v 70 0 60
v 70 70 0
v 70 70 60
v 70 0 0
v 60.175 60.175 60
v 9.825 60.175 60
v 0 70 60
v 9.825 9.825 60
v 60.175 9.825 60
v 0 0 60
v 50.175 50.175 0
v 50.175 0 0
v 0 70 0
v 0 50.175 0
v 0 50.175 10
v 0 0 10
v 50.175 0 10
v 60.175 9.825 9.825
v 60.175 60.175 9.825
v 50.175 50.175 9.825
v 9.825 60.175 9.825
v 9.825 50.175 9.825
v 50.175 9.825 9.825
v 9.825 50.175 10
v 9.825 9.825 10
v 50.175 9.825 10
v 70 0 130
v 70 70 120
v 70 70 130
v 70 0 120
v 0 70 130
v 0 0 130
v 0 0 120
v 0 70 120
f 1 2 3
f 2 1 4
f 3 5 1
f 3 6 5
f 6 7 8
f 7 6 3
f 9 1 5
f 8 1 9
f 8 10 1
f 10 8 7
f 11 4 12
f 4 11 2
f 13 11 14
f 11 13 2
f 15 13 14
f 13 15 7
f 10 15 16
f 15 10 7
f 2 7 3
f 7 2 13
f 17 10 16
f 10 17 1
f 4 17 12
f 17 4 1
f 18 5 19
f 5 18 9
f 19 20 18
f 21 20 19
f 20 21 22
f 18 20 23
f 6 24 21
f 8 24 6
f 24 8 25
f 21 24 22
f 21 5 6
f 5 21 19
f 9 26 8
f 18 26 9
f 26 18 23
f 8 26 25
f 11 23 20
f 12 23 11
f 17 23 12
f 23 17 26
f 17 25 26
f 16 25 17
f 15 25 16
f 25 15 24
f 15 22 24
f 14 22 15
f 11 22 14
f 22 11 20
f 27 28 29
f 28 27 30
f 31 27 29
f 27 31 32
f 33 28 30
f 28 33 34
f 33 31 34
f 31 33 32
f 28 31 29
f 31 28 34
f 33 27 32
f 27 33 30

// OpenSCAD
heatsink_xsize = 50;
heatsink_ysize = 50;
heatsink_zsize = 50;

TEG_xsize = 50;
TEG_ysize = 50;
TEG_zsize = 50;

mount_hole = 3.5;
clearance = 0.175;
sealing_ring_width = 3; 
wall_thickness = 10;

height = heatsink_zsize + wall_thickness;


difference () {
    union (){
        cube([heatsink_xsize+2*wall_thickness,heatsink_ysize+2*wall_thickness,heatsink_zsize+wall_thickness]);          // overal plastic brick
//            cube([heatsink_xsize+2*wall_thickness,heatsink_ysize+2*wall_thickness,heatsink_zsize+wall_thickness]);          // overal plastic brick
    }

    translate ([wall_thickness-clearance, wall_thickness-clearance, wall_thickness-clearance])
        cube([heatsink_xsize+2*clearance, heatsink_ysize+2*clearance, heatsink_xsize+2*clearance]);          // hollow for heat sink and heat storage liquid.

    translate ([(heatsink_xsize-TEG_xsize)/2 - clearance, (heatsink_ysize-TEG_ysize)/2 - clearance, 0])
        cube([TEG_xsize+2*clearance, TEG_ysize+2*clearance, wall_thickness]);          // hollow for the thermoelectric generator

    translate ([0, 0, height-sealing_ring_width/2])
        difference () {
            minkowski() {
                cube([heatsink_xsize-sealing_ring_width/2, heatsink_xsize-sealing_ring_width/2, 5]);          // Rib for o-ring. 
                cylinder(r=wall_thickness/2,h=0.1);
            }

            minkowski() {
                cube([heatsink_xsize+sealing_ring_width/2, heatsink_xsize+sealing_ring_width/2, 5]);          // Rib for o-ring. 
                cylinder(r=wall_thickness/2,h=0.1);
            }
        }
/*
    rotate([0,0,-45])       // hole for top part mounting nut
        translate ([ 0, -y_size/3, thickness/3])    
            cube([6, 3, thickness], center = true);

    rotate([90,0,-45])      // hole for top part mounting screw.
        translate ([ 0, 1.8, 0])    
            cylinder (h = thickness + rim_height, r= mount_hole/2, $fn=20);
*/
}

// Heat reservoir cover

translate ([0, 0, 2*height])
    cube([heatsink_xsize+2*wall_thickness,heatsink_ysize+2*wall_thickness,wall_thickness]);
